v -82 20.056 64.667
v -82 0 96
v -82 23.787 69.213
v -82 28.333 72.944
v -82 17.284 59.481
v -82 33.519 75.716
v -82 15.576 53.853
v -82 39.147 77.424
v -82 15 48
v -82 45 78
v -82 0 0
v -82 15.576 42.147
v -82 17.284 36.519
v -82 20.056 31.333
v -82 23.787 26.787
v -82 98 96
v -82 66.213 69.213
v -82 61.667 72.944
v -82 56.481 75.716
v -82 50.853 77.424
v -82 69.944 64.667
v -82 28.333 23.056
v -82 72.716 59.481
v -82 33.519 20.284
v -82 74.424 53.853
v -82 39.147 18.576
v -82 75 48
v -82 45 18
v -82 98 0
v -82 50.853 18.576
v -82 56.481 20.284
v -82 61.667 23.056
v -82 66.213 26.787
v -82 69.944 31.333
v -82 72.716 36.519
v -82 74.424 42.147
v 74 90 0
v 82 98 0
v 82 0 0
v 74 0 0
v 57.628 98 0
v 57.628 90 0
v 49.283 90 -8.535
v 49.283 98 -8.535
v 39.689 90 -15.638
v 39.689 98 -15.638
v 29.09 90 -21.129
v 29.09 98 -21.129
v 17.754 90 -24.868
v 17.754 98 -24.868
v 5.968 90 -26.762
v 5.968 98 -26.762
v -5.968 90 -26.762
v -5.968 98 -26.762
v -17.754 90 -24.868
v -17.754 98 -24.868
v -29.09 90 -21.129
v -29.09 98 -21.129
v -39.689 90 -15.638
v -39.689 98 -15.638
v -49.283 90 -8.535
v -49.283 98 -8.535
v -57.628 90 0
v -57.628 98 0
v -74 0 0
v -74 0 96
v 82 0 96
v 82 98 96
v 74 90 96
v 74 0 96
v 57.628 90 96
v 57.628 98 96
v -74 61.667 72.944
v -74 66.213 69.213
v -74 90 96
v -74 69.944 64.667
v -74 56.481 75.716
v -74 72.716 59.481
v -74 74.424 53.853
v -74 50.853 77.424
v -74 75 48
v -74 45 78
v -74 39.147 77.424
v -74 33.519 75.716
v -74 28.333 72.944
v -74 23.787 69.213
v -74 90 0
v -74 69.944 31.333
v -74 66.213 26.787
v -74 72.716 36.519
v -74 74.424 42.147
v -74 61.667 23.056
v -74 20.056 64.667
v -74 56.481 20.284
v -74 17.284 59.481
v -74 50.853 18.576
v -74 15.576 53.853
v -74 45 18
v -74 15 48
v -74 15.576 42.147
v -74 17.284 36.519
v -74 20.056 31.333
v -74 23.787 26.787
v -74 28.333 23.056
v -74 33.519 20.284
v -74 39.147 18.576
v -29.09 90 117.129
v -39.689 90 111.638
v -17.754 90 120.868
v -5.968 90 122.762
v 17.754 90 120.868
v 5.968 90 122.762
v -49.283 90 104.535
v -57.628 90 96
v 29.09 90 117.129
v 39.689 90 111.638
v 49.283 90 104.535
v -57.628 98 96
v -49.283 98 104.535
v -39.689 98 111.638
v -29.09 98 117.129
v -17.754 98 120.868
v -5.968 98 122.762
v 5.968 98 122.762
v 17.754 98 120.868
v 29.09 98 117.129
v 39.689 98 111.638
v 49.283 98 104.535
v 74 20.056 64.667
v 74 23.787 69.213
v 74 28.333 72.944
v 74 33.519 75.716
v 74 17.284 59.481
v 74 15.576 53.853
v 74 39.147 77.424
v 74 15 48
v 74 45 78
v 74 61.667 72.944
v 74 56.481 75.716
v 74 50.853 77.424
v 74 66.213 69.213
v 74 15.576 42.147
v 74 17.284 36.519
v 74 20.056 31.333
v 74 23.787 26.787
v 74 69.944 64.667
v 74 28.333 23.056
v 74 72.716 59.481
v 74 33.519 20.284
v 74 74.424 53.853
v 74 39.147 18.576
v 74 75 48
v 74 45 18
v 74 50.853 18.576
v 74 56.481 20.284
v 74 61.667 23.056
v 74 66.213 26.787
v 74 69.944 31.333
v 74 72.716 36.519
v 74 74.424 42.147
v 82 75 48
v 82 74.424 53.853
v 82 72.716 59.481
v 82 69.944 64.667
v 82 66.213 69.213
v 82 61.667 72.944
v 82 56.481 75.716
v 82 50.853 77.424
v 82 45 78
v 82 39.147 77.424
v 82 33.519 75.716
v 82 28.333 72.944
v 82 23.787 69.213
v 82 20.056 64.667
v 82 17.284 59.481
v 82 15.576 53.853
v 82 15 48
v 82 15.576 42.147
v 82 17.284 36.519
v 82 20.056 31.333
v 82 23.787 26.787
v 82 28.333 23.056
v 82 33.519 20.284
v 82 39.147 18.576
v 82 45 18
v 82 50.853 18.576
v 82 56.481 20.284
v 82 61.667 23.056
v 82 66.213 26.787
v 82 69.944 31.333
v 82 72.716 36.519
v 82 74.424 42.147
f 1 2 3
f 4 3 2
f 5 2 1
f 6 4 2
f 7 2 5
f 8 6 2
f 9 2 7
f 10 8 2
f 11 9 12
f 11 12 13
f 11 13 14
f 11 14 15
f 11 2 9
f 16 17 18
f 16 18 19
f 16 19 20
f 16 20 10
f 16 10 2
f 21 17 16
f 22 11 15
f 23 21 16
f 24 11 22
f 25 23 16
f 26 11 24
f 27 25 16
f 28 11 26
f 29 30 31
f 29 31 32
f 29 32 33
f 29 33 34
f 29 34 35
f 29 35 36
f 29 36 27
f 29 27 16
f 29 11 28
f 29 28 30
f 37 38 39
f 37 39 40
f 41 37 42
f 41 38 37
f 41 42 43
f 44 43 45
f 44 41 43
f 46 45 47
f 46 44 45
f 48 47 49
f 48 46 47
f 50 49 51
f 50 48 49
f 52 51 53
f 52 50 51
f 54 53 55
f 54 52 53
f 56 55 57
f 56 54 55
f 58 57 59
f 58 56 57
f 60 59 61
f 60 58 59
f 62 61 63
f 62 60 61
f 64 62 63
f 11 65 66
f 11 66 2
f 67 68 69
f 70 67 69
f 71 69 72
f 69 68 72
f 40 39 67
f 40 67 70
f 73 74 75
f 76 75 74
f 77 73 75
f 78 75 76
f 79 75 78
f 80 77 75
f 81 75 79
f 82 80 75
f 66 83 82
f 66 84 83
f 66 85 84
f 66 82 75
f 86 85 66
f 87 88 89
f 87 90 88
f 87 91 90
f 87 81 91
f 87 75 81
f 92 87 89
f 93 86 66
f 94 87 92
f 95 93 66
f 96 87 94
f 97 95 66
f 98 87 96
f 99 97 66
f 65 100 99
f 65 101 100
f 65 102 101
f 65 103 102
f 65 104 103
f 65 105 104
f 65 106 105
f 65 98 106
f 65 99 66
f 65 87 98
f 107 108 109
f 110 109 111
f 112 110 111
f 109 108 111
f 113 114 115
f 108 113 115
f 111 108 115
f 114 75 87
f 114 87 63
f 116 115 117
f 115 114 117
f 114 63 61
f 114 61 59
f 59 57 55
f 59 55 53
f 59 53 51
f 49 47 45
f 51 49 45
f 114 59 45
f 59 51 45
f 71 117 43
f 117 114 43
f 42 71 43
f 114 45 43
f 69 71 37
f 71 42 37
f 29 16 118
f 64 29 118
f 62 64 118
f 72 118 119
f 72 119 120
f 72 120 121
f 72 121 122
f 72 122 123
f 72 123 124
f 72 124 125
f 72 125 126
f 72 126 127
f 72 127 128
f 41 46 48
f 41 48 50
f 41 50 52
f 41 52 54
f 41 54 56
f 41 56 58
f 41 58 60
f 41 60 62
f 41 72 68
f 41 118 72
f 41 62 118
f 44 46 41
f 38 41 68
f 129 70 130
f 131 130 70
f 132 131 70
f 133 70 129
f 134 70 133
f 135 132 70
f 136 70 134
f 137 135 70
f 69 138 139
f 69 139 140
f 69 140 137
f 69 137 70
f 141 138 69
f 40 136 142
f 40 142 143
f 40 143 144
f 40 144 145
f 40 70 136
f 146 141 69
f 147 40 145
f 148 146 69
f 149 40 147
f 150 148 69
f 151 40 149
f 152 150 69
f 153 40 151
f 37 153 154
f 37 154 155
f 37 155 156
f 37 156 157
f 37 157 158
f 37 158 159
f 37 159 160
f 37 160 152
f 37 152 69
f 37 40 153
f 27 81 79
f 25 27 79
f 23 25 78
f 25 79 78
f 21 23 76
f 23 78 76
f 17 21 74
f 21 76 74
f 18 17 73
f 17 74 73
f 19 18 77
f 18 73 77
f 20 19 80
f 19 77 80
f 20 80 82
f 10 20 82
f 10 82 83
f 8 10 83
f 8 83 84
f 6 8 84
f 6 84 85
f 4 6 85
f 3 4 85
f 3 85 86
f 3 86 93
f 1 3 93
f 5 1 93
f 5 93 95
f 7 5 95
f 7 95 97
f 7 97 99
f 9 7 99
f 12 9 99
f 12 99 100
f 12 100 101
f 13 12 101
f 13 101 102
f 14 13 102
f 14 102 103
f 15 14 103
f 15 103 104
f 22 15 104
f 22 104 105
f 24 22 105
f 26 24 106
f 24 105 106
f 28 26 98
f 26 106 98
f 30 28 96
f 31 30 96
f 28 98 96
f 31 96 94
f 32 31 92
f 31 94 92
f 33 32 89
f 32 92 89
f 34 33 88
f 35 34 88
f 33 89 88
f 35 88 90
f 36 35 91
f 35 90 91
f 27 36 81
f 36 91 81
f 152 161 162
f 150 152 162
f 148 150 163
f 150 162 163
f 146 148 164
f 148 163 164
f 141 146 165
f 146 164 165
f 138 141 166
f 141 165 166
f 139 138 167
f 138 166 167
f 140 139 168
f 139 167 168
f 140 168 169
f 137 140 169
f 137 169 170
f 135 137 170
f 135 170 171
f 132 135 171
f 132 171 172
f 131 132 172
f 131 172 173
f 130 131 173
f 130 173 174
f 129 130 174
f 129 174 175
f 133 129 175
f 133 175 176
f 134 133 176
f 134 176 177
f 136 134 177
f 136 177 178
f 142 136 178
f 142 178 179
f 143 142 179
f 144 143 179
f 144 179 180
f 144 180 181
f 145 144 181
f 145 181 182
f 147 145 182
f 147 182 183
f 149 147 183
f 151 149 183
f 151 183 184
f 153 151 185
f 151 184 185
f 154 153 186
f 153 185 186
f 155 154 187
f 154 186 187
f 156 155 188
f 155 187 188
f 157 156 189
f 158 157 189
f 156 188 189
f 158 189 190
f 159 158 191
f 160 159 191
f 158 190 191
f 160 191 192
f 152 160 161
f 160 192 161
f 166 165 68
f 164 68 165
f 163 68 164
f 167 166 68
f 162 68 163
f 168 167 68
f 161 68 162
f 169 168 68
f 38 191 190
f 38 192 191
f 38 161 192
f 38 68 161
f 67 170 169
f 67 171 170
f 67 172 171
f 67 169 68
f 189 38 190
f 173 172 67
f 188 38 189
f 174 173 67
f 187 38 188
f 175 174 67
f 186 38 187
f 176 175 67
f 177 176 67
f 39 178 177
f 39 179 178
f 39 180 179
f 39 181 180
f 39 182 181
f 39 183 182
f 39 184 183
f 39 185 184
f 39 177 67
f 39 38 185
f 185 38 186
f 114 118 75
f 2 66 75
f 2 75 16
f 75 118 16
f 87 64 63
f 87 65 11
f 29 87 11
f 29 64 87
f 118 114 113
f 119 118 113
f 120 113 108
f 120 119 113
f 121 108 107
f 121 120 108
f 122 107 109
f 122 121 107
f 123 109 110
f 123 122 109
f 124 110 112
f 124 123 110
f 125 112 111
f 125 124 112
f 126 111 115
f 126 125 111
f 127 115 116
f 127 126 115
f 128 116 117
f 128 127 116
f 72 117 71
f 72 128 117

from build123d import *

# Parameters (mm, degrees)
EXTRUDE_1_DEPTH     = 96
SKETCH_2_R          = 30
CUT_EXTRUDE_1_DEPTH = 172
SKETCH_3_R          = 75
EXTRUDE_2_DEPTH     = 8


with BuildPart() as part:
    # 草图1 → 凸台-拉伸1 (new body)
    with BuildSketch(Plane.XY):
        Polygon((-82, 98), (82, 98), (82, 0), (74, 0), (74, 90), (-74, 90), (-74, 0), (-82, 0), align=None)
    extrude(amount=EXTRUDE_1_DEPTH)

    # 草图2 → 切除-拉伸1 (cut)
    with BuildSketch(Plane(origin=(82, 0, 0), x_dir=(0, 0, -1), z_dir=(1, 0, 0))):
        with Locations(Location((-48, 45, 0), (0, 0, 90))):
            Circle(SKETCH_2_R)
    extrude(amount=-CUT_EXTRUDE_1_DEPTH, mode=Mode.SUBTRACT)

    # 草图3 → 凸台-拉伸2 (add)
    with BuildSketch(Plane(origin=(0, 98, 0), x_dir=(1, 0, 0), z_dir=(0, 1, 0))):
        with Locations((0, -48)):
            Circle(SKETCH_3_R)
    extrude(amount=-EXTRUDE_2_DEPTH)


solid = part.part
